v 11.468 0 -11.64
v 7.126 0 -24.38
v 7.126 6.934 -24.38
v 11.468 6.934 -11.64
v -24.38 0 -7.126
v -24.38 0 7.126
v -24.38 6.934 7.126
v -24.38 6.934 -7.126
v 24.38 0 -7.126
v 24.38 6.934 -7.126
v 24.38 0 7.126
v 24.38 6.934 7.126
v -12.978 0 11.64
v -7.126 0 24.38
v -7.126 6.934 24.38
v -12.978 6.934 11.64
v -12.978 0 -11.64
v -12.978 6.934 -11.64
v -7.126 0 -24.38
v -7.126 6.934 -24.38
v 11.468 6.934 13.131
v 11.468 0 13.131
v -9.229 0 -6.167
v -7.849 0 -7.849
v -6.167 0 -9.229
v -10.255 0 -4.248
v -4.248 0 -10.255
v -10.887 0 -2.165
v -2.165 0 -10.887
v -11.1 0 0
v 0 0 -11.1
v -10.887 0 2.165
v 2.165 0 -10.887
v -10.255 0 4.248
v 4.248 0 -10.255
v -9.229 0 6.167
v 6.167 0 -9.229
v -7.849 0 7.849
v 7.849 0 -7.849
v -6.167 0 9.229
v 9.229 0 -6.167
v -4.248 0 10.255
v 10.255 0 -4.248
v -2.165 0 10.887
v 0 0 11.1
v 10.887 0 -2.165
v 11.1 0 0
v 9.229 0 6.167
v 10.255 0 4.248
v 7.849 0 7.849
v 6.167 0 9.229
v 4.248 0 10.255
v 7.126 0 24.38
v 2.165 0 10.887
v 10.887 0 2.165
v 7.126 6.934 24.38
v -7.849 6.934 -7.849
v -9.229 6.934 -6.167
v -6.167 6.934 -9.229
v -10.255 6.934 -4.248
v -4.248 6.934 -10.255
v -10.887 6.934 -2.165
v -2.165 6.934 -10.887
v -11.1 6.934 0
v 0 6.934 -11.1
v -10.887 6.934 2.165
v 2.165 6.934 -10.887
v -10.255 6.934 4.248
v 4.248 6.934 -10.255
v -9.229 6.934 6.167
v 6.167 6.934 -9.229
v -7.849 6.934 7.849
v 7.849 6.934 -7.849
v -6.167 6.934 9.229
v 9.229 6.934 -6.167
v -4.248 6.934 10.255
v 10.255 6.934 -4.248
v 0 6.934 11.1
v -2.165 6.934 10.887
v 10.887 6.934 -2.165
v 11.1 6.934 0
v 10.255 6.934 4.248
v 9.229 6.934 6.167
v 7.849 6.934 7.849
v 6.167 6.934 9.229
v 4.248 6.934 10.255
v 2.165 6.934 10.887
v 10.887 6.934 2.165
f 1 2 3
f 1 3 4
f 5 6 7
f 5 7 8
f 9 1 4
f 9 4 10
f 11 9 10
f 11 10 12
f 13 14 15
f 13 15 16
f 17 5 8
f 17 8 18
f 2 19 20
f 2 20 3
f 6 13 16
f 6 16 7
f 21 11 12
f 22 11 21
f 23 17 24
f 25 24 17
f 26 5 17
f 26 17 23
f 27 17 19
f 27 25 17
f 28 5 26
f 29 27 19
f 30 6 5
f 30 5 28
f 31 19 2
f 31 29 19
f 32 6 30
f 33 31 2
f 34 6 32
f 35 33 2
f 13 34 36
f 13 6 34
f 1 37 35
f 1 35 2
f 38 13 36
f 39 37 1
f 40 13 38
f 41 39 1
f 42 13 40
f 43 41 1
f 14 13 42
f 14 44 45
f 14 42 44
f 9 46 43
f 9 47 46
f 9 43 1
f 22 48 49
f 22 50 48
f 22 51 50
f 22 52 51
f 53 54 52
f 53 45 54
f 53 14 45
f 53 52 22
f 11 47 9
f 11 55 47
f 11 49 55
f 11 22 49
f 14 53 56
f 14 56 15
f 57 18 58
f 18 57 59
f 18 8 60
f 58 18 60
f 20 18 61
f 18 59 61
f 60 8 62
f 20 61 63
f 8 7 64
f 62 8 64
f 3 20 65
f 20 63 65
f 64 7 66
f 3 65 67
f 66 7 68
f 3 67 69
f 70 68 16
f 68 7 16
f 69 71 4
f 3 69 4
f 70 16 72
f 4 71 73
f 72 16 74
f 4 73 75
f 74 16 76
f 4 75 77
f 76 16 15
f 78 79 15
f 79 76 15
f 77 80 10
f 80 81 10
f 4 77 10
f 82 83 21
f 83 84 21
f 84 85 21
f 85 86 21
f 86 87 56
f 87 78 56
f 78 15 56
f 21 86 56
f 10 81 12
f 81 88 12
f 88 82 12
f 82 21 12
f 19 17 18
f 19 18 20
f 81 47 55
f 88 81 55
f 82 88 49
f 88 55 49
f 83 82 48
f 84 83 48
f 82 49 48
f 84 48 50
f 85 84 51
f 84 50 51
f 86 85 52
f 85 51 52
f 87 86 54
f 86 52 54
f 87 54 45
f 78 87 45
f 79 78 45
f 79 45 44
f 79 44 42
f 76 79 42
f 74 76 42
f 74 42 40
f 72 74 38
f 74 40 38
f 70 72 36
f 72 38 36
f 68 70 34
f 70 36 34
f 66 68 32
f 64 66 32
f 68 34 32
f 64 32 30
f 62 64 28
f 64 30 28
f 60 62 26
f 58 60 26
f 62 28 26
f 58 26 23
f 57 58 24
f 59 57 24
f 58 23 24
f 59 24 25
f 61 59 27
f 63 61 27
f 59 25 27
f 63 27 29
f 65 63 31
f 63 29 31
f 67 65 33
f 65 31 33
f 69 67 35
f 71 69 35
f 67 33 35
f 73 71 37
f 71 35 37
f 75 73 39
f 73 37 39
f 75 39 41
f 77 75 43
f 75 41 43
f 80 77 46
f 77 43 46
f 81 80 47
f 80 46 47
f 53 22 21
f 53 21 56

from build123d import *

# Parameters (mm, degrees)
F0_R     = 11.0998
F1_DEPTH = 6.9342


with BuildPart() as f1:
    # F0 (on Front) → F1 (new body)
    with BuildSketch(Plane.XZ):
        Polygon((7.125813, 24.379967), (-7.125813, 24.379967), (-12.977696, 11.640459), (-24.379967, 7.125813), (-24.379967, -7.125813), (-12.977696, -11.640459), (-7.125813, -24.379967), (7.125813, -24.379967), (11.467626, -11.640459), (24.379967, -7.125813), (24.379967, 7.125813), (11.467626, 13.130667), align=None)
        Circle(F0_R, mode=Mode.SUBTRACT)
    extrude(amount=-F1_DEPTH)


solid = f1.part
